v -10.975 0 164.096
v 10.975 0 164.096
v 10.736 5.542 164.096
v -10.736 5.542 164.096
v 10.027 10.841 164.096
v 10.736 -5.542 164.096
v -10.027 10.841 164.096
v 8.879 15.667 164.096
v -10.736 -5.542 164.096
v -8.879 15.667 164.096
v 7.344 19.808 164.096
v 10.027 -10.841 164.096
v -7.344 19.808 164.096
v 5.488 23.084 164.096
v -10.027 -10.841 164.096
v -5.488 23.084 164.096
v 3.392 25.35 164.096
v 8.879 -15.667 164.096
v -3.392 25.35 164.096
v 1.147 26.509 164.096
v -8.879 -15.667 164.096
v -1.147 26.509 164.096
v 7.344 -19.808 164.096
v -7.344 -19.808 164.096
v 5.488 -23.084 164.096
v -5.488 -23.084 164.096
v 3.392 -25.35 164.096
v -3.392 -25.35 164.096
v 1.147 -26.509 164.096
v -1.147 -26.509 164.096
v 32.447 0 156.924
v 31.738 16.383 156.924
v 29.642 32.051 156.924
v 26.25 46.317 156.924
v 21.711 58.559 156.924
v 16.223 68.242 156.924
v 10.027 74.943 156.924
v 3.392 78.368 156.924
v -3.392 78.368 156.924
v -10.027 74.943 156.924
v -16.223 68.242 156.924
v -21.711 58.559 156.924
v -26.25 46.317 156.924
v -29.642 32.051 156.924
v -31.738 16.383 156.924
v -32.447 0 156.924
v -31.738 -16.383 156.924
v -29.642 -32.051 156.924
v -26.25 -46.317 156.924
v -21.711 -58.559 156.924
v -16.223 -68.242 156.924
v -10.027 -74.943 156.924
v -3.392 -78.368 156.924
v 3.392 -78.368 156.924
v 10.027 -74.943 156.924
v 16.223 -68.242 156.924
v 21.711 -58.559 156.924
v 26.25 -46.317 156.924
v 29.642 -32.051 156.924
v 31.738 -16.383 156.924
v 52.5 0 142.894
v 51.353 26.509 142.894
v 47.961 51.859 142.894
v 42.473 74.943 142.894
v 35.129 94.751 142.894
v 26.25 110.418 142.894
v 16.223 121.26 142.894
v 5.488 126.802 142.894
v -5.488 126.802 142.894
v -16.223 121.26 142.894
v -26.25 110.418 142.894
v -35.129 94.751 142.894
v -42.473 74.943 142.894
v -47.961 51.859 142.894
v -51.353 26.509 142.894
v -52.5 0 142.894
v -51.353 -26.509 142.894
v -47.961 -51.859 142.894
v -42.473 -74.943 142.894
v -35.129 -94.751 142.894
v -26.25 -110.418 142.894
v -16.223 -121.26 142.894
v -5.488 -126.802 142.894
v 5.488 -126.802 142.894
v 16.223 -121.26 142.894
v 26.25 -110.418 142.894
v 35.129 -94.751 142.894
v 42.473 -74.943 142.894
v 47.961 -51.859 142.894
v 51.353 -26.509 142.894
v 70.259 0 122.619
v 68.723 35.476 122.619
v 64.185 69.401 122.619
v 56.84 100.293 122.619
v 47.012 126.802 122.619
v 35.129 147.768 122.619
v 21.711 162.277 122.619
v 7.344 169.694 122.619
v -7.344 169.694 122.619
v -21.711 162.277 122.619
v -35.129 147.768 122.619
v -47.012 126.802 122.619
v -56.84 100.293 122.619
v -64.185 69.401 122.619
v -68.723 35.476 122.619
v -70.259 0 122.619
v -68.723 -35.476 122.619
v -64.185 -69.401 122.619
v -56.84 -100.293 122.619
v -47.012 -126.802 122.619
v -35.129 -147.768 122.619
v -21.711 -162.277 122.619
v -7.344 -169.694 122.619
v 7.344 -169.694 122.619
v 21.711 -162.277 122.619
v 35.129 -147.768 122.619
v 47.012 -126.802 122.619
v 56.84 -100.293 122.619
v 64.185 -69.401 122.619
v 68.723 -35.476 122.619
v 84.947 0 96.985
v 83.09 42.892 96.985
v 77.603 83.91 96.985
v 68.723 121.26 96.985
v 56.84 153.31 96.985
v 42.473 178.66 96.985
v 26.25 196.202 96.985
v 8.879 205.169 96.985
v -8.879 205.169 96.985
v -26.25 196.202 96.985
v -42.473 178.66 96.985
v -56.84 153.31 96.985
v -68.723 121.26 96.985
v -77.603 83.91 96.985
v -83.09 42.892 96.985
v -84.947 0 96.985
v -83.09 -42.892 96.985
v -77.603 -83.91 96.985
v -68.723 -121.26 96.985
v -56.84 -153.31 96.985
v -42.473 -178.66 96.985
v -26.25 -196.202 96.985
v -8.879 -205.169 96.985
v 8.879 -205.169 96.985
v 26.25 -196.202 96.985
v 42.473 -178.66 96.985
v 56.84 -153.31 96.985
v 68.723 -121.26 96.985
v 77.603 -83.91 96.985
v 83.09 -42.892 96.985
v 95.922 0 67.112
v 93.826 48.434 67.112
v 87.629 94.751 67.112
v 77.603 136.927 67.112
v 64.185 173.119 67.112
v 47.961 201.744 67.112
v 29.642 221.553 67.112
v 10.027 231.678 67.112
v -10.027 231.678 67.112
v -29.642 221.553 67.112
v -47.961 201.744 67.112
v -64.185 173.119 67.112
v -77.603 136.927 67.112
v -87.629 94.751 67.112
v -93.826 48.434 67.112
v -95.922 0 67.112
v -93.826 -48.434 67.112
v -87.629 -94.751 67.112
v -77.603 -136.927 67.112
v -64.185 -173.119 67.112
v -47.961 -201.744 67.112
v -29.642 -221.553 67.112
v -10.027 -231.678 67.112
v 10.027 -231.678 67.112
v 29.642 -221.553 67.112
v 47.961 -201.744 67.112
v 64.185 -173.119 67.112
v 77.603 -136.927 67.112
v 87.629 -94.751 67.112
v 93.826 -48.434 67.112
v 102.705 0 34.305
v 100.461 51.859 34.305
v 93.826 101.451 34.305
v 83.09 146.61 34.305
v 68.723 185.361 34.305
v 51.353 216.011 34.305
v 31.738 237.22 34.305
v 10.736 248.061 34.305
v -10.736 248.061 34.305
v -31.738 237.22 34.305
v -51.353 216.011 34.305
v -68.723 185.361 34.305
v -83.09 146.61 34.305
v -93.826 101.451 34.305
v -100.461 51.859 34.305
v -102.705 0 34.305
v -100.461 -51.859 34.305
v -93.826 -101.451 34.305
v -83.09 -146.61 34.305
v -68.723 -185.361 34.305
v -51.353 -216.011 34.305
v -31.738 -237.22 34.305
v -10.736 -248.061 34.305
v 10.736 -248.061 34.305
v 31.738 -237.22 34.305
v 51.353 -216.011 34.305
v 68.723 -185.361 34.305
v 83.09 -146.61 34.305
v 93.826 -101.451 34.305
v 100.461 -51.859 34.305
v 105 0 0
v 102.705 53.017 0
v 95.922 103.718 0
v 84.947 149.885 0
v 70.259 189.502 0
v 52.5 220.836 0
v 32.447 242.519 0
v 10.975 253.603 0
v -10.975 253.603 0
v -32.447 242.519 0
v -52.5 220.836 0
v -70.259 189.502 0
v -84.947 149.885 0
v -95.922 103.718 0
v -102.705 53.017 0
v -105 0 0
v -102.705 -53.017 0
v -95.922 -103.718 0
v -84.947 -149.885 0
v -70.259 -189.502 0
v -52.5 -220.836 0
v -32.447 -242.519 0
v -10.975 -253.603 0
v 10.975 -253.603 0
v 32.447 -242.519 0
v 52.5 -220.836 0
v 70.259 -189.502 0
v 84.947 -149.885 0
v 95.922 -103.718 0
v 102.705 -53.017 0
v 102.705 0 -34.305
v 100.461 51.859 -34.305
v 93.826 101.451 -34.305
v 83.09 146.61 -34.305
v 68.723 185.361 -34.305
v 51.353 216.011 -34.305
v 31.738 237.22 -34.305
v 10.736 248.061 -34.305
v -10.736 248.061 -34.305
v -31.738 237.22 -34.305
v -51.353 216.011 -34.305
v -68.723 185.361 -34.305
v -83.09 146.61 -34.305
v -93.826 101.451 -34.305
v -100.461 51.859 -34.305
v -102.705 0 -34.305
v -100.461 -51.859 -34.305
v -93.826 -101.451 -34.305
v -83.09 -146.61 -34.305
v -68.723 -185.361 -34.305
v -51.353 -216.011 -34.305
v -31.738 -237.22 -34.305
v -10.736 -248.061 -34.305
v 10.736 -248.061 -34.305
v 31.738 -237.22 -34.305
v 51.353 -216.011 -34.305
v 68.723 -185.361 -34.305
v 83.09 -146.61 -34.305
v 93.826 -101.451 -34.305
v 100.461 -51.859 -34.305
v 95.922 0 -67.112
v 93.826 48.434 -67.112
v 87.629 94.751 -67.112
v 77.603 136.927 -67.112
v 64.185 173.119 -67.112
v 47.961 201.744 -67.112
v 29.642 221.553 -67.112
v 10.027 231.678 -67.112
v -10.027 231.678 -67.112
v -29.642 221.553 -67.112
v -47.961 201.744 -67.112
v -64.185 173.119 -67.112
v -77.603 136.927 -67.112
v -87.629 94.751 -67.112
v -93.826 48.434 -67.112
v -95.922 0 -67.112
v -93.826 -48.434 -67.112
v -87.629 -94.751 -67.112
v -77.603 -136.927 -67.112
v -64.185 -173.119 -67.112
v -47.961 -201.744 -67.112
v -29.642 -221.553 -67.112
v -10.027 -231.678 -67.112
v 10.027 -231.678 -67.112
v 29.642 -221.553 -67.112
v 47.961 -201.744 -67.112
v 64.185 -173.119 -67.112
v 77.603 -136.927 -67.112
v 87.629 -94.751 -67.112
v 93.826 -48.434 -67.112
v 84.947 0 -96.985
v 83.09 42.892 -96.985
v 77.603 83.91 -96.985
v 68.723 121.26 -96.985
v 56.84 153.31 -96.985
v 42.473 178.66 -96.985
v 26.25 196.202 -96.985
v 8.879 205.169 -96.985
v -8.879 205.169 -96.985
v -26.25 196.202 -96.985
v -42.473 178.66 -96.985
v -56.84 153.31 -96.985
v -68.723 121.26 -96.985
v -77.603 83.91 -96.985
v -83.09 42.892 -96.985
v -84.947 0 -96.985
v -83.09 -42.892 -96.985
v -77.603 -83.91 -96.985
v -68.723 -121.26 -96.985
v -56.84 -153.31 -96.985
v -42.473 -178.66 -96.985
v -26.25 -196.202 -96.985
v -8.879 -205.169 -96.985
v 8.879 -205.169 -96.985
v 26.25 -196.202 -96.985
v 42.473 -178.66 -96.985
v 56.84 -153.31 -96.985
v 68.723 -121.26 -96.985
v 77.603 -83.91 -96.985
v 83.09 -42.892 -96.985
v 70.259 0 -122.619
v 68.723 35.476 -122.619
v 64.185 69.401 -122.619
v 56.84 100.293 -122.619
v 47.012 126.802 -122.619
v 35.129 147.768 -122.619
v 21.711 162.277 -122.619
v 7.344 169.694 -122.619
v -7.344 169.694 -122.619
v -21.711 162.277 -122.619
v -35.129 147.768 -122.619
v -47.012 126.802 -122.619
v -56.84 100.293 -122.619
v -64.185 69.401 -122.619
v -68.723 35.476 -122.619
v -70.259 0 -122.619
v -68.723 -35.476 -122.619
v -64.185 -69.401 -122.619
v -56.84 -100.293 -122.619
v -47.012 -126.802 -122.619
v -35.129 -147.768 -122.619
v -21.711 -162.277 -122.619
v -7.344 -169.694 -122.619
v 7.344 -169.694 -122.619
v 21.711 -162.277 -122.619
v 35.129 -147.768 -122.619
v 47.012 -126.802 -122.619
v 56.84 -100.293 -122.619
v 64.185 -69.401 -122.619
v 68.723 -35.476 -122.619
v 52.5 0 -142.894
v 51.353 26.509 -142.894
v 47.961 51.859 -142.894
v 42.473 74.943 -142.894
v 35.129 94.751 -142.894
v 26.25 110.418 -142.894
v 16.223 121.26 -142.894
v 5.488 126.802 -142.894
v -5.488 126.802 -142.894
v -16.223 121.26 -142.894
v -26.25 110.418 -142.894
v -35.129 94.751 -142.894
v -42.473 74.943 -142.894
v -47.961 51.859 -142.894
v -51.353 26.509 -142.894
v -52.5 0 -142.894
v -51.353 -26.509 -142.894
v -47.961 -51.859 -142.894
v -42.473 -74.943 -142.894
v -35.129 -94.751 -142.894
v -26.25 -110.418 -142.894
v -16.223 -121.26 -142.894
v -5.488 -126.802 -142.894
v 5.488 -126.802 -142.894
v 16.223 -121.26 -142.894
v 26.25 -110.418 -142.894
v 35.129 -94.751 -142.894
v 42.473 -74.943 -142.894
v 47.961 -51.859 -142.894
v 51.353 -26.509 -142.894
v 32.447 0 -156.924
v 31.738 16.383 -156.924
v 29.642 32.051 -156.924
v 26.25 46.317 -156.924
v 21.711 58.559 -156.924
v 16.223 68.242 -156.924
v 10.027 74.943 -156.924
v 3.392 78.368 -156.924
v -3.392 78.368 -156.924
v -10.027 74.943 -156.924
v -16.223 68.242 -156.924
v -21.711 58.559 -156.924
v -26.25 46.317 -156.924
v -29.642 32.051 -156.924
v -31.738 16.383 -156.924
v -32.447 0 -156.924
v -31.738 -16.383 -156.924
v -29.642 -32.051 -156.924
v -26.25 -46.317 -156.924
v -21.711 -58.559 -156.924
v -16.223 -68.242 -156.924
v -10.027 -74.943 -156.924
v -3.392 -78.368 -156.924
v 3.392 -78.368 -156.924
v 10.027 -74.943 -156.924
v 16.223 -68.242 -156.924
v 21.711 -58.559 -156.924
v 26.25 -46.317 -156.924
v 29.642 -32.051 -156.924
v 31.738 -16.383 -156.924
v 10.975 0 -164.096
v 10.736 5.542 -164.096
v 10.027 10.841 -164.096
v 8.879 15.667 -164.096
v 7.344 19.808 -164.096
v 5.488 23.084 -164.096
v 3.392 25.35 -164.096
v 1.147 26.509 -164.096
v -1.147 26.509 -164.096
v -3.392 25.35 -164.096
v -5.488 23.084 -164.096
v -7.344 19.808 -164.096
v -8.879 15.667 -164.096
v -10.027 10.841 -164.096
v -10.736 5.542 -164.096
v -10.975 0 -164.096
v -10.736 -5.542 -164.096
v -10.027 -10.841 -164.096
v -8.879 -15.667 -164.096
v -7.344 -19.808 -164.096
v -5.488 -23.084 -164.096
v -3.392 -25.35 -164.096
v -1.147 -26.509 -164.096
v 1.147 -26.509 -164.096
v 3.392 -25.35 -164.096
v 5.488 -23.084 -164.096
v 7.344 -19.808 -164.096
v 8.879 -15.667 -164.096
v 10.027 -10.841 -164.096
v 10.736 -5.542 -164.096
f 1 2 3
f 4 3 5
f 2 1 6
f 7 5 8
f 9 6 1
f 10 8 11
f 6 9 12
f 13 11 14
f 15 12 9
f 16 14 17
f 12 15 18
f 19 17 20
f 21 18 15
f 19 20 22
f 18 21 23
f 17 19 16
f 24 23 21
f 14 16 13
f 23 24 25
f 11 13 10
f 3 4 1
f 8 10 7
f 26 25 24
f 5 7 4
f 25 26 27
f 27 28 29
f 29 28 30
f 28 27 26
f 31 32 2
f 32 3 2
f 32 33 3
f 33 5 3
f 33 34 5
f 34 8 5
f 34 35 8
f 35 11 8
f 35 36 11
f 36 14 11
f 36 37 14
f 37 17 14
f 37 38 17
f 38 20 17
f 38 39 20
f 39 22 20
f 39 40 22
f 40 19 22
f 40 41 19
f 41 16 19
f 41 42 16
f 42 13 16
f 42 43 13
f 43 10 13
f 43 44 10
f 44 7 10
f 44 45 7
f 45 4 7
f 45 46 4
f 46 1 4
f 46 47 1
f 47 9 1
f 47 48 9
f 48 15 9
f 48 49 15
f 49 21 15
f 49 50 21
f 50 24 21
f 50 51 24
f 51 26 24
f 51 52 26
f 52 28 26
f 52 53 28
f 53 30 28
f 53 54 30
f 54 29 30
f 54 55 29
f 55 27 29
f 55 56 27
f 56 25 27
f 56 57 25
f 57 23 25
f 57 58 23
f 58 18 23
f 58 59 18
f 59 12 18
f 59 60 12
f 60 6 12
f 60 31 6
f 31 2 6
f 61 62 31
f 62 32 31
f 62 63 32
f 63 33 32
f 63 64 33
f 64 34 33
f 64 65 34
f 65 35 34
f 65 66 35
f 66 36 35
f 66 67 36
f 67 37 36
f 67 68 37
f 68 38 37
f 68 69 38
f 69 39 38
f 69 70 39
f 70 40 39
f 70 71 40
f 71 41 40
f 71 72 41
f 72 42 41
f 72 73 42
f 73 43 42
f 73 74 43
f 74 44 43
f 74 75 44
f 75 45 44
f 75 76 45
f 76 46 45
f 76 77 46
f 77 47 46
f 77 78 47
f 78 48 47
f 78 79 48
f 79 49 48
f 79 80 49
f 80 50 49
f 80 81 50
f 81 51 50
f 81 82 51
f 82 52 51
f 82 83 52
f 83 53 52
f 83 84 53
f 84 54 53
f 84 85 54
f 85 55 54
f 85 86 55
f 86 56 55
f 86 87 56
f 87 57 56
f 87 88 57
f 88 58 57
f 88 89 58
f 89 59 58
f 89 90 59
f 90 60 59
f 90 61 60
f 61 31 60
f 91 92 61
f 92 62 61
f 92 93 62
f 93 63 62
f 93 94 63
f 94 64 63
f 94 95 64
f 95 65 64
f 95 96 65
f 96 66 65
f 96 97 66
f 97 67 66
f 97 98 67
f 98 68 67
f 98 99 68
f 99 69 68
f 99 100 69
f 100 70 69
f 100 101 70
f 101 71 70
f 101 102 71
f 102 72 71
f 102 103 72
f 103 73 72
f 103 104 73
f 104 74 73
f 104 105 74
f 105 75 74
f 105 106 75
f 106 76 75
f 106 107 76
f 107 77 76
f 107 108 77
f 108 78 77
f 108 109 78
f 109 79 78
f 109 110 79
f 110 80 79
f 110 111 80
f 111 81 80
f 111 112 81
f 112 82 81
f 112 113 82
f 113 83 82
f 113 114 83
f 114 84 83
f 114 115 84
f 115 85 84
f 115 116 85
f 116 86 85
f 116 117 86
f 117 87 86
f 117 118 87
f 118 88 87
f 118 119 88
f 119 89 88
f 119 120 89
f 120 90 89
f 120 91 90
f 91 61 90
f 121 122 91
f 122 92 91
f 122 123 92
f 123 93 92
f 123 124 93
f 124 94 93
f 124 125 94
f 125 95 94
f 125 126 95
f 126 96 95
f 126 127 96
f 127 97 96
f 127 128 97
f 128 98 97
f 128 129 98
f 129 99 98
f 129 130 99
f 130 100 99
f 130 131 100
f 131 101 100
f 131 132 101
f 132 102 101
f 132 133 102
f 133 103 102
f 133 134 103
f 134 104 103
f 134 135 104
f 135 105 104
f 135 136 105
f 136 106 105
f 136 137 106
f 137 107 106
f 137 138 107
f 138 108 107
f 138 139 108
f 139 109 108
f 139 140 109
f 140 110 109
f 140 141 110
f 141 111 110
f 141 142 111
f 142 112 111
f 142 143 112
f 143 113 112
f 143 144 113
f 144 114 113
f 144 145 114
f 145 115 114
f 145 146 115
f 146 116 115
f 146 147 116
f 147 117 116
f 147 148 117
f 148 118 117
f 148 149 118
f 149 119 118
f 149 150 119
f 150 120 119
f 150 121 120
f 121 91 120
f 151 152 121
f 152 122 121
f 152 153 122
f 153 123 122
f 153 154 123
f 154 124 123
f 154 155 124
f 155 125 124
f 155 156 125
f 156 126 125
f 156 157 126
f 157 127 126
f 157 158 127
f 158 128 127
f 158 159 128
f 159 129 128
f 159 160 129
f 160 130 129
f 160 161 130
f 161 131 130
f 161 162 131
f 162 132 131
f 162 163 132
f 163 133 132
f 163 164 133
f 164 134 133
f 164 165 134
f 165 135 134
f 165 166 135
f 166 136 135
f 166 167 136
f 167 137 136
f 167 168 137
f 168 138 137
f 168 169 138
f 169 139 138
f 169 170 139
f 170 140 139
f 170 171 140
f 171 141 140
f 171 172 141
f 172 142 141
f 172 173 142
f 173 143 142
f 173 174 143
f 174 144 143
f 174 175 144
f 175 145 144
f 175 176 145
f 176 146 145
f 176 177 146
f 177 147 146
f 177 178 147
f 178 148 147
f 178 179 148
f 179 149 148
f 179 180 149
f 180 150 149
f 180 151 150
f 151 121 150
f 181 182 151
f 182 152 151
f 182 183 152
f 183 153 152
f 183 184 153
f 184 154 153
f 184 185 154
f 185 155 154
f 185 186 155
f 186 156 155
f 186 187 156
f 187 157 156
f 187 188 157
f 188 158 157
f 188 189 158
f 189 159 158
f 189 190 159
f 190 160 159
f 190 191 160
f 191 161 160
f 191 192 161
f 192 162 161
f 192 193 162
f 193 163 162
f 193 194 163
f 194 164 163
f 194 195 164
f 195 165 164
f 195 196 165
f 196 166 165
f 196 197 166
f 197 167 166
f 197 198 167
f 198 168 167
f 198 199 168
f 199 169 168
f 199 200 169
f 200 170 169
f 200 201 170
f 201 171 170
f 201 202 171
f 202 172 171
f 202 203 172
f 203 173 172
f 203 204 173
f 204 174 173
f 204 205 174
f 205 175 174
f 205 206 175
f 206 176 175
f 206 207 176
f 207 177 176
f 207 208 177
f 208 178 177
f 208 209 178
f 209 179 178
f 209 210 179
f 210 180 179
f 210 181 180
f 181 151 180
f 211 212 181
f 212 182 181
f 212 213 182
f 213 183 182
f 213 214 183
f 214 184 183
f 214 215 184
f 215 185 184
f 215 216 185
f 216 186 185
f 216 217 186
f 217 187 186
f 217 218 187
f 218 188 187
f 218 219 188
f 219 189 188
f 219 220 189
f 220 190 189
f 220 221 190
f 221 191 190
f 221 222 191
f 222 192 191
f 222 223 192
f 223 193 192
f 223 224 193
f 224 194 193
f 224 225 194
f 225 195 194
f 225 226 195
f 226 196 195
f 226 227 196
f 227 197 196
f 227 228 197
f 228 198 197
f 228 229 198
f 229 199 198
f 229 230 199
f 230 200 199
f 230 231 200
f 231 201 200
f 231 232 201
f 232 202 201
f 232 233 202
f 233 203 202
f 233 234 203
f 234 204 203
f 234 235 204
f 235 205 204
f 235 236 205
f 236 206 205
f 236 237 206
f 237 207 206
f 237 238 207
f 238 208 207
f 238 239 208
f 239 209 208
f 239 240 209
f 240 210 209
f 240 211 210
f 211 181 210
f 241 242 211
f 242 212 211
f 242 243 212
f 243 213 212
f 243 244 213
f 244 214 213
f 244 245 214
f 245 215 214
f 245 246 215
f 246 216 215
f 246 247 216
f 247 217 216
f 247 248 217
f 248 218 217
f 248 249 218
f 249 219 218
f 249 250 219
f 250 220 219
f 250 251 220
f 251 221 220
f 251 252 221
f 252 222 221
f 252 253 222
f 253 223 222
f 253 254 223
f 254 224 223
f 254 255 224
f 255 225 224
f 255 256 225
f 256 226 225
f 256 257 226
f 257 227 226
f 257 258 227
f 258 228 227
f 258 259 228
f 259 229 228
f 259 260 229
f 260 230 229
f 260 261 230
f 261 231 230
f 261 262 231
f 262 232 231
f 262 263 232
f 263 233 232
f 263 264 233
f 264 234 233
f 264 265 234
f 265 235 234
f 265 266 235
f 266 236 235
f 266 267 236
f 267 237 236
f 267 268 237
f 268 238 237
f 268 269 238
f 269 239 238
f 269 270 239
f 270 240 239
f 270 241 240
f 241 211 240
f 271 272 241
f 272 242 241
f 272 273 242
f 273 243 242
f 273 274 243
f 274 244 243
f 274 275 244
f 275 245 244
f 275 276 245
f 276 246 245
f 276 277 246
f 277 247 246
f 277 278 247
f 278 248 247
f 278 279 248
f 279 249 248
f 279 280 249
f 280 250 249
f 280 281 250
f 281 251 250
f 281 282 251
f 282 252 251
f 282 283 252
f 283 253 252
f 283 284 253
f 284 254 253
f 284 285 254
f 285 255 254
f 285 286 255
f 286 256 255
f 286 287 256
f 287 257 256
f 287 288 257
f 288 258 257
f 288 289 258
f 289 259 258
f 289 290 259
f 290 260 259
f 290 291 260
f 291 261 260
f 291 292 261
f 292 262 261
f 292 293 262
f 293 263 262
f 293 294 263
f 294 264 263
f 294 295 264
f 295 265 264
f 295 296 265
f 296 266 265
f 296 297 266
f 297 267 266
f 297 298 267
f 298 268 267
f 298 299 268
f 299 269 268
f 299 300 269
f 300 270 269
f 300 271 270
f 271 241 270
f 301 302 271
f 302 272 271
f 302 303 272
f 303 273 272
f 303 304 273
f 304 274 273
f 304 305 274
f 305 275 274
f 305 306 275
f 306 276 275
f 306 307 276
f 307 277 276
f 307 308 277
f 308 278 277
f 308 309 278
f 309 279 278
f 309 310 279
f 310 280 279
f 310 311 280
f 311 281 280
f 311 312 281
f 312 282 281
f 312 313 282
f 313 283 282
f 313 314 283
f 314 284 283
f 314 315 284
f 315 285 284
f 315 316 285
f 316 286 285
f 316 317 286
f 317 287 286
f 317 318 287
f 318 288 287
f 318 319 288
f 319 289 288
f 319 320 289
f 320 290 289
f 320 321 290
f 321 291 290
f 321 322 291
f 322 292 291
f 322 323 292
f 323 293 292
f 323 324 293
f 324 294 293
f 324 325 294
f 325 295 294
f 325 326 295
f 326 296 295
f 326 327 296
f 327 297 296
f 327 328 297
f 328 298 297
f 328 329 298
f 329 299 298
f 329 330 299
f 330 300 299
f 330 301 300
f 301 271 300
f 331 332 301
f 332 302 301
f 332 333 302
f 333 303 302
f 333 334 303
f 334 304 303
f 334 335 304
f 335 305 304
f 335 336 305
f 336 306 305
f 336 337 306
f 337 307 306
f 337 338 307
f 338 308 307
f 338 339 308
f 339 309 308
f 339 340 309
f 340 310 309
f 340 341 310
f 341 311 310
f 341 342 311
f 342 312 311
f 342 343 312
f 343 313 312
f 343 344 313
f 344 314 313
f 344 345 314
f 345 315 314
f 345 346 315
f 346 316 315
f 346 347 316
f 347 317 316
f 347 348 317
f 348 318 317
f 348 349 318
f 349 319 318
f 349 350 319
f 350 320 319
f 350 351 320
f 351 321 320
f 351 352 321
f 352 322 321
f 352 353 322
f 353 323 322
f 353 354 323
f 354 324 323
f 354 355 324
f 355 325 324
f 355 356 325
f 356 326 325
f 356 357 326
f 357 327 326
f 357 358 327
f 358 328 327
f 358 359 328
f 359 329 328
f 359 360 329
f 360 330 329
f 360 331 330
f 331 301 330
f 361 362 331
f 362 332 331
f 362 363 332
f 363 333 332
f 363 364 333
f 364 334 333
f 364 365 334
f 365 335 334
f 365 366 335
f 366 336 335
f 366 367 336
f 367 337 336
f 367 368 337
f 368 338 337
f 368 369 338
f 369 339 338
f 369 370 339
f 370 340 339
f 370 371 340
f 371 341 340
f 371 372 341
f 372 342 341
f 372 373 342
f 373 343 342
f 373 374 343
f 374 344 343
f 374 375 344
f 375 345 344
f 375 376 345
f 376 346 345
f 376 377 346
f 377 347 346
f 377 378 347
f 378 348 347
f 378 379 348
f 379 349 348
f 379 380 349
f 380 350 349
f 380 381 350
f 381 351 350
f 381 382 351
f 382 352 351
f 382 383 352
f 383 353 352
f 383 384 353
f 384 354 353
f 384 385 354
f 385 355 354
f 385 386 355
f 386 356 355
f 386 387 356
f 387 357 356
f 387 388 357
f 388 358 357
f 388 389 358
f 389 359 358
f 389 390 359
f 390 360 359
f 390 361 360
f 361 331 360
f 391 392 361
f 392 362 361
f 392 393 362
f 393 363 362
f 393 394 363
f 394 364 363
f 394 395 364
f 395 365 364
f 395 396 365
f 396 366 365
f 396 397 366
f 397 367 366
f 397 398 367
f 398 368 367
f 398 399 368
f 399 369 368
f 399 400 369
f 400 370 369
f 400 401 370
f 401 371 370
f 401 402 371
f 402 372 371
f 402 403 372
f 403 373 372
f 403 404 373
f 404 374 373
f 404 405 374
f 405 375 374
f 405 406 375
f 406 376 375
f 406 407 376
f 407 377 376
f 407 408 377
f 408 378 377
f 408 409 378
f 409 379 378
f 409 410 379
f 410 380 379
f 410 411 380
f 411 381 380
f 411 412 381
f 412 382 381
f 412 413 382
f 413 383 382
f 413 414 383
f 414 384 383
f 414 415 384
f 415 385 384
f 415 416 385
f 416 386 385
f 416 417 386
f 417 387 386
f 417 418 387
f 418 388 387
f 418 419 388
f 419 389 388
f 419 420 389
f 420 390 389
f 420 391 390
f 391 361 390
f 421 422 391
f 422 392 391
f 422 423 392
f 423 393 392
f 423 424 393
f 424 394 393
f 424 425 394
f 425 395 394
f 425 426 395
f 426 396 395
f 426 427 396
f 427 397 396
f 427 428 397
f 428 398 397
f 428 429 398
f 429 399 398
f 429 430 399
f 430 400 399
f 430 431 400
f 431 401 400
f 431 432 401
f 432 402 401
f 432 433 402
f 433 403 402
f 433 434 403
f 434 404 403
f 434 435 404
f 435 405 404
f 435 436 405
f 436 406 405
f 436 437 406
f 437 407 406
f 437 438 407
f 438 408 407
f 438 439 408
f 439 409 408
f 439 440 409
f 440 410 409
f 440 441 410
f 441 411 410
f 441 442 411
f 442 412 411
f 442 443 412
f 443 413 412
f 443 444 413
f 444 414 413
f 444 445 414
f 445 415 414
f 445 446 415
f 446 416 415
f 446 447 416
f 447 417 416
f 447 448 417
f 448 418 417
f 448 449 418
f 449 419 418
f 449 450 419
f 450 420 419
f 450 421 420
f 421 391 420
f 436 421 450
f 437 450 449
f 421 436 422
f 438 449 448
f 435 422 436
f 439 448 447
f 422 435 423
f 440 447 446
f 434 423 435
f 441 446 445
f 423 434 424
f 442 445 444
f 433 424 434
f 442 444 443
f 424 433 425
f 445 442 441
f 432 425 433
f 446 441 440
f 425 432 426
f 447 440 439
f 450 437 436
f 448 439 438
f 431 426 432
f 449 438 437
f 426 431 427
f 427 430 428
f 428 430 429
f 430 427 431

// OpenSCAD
// Generated by SolidPython 1.0.1 on 2020-07-29 00:46:48


scale(v = [7, 17, 11]) {
	sphere(r = 15);
}
/***********************************************
*********      SolidPython code:      **********
************************************************
 
# import packages: SolidPython
from solid import *
from solid.utils import *
from itertools import chain, combinations, permutations


class Resize:

    def __init__(self, scad_file):
        self.scad_file = scad_file
        #self.scad_file = import_scad(scad_file)
        # cone/cylinder param:
        self.r1 = 0
        self.r2 = 0
        self.h = 0
        # rectangular prism param:
        self.w = 0
        self.l = 0
        # ellipse param:
        self.r = 0

    # import OpenScad code (file name corresponds to shape)


    # classify shape + parameters
    def assign(self, param1, param2, param3):
        if self.scad_file == 'cone.scad':
            self.r1 = param1
            self.r2 = param2
            self.h = param3
        elif self.scad_file == 'cylinder.scad':
            self.r1 = param1
            self.r2 = param2
            self.h = param3
        elif self.scad_file == 'rectangularPrism.scad':
            self.h = param1
            self.l = param2
            self.w = param3
        else:
            self.r = param1
            self.h = param2

    # resize parameters
    def iterate(self):
        x = range(3, 20, 2)
        i = 1
        if self.scad_file == 'cone.scad':
            tempList = list(permutations(x, 2))
            for temp in tempList:
                param1 = temp[0]
                param2 = temp[1]
                filepath = 'produced_scad_files/' + 'cone' + str(param1) + '_' + str(param2) + '_' + '.scad'
                scad_render_to_file(cylinder(h=param1, r1=param2, r2=0), filepath)

        elif self.scad_file == 'cylinder.scad':
            tempList = list(permutations(x, 3))
            for temp in tempList:
                param1 = temp[0]
                param2 = temp[1]
                filepath = 'produced_scad_files/' + 'cylinder' + str(param1) + '_' + str(param2) + '_' + '.scad'
                scad_render_to_file(cylinder(h=param1, r1=param2, r2=param2), filepath)

        elif self.scad_file == 'rectangularPrism.scad':
            tempList = list(permutations(x, 3))
            for temp in tempList:
                param1 = temp[0]
                param2 = temp[1]
                param3 = temp[2]
                filepath = 'produced_scad_files/' + 'rectangularPrism' + str(param1) + '_' + str(param2) + '_' + str(
                    param3) + '.scad'
                scad_render_to_file(cube(size=(param1, param2, param3)), filepath)

        elif self.scad_file == 'ellipse.scad':
            tempList = list(permutations(x, 4))
            for temp in tempList:
                param1 = temp[0]
                param2 = temp[1]
                param3 = temp[2]
                param4 = temp[3]
                filepath = 'produced_scad_files/' + 'ellipse' + str(param1) + '_' + str(param2) + '_' + str(param3) + '_' + str(param4) + '.scad'
                scad_render_to_file(scale([param1, param2, param3])(sphere(r=param4)), filepath)

    def render_to_scadfile(self):
        scad_render_to_file(scad, 'example.scad') 
 
************************************************/
